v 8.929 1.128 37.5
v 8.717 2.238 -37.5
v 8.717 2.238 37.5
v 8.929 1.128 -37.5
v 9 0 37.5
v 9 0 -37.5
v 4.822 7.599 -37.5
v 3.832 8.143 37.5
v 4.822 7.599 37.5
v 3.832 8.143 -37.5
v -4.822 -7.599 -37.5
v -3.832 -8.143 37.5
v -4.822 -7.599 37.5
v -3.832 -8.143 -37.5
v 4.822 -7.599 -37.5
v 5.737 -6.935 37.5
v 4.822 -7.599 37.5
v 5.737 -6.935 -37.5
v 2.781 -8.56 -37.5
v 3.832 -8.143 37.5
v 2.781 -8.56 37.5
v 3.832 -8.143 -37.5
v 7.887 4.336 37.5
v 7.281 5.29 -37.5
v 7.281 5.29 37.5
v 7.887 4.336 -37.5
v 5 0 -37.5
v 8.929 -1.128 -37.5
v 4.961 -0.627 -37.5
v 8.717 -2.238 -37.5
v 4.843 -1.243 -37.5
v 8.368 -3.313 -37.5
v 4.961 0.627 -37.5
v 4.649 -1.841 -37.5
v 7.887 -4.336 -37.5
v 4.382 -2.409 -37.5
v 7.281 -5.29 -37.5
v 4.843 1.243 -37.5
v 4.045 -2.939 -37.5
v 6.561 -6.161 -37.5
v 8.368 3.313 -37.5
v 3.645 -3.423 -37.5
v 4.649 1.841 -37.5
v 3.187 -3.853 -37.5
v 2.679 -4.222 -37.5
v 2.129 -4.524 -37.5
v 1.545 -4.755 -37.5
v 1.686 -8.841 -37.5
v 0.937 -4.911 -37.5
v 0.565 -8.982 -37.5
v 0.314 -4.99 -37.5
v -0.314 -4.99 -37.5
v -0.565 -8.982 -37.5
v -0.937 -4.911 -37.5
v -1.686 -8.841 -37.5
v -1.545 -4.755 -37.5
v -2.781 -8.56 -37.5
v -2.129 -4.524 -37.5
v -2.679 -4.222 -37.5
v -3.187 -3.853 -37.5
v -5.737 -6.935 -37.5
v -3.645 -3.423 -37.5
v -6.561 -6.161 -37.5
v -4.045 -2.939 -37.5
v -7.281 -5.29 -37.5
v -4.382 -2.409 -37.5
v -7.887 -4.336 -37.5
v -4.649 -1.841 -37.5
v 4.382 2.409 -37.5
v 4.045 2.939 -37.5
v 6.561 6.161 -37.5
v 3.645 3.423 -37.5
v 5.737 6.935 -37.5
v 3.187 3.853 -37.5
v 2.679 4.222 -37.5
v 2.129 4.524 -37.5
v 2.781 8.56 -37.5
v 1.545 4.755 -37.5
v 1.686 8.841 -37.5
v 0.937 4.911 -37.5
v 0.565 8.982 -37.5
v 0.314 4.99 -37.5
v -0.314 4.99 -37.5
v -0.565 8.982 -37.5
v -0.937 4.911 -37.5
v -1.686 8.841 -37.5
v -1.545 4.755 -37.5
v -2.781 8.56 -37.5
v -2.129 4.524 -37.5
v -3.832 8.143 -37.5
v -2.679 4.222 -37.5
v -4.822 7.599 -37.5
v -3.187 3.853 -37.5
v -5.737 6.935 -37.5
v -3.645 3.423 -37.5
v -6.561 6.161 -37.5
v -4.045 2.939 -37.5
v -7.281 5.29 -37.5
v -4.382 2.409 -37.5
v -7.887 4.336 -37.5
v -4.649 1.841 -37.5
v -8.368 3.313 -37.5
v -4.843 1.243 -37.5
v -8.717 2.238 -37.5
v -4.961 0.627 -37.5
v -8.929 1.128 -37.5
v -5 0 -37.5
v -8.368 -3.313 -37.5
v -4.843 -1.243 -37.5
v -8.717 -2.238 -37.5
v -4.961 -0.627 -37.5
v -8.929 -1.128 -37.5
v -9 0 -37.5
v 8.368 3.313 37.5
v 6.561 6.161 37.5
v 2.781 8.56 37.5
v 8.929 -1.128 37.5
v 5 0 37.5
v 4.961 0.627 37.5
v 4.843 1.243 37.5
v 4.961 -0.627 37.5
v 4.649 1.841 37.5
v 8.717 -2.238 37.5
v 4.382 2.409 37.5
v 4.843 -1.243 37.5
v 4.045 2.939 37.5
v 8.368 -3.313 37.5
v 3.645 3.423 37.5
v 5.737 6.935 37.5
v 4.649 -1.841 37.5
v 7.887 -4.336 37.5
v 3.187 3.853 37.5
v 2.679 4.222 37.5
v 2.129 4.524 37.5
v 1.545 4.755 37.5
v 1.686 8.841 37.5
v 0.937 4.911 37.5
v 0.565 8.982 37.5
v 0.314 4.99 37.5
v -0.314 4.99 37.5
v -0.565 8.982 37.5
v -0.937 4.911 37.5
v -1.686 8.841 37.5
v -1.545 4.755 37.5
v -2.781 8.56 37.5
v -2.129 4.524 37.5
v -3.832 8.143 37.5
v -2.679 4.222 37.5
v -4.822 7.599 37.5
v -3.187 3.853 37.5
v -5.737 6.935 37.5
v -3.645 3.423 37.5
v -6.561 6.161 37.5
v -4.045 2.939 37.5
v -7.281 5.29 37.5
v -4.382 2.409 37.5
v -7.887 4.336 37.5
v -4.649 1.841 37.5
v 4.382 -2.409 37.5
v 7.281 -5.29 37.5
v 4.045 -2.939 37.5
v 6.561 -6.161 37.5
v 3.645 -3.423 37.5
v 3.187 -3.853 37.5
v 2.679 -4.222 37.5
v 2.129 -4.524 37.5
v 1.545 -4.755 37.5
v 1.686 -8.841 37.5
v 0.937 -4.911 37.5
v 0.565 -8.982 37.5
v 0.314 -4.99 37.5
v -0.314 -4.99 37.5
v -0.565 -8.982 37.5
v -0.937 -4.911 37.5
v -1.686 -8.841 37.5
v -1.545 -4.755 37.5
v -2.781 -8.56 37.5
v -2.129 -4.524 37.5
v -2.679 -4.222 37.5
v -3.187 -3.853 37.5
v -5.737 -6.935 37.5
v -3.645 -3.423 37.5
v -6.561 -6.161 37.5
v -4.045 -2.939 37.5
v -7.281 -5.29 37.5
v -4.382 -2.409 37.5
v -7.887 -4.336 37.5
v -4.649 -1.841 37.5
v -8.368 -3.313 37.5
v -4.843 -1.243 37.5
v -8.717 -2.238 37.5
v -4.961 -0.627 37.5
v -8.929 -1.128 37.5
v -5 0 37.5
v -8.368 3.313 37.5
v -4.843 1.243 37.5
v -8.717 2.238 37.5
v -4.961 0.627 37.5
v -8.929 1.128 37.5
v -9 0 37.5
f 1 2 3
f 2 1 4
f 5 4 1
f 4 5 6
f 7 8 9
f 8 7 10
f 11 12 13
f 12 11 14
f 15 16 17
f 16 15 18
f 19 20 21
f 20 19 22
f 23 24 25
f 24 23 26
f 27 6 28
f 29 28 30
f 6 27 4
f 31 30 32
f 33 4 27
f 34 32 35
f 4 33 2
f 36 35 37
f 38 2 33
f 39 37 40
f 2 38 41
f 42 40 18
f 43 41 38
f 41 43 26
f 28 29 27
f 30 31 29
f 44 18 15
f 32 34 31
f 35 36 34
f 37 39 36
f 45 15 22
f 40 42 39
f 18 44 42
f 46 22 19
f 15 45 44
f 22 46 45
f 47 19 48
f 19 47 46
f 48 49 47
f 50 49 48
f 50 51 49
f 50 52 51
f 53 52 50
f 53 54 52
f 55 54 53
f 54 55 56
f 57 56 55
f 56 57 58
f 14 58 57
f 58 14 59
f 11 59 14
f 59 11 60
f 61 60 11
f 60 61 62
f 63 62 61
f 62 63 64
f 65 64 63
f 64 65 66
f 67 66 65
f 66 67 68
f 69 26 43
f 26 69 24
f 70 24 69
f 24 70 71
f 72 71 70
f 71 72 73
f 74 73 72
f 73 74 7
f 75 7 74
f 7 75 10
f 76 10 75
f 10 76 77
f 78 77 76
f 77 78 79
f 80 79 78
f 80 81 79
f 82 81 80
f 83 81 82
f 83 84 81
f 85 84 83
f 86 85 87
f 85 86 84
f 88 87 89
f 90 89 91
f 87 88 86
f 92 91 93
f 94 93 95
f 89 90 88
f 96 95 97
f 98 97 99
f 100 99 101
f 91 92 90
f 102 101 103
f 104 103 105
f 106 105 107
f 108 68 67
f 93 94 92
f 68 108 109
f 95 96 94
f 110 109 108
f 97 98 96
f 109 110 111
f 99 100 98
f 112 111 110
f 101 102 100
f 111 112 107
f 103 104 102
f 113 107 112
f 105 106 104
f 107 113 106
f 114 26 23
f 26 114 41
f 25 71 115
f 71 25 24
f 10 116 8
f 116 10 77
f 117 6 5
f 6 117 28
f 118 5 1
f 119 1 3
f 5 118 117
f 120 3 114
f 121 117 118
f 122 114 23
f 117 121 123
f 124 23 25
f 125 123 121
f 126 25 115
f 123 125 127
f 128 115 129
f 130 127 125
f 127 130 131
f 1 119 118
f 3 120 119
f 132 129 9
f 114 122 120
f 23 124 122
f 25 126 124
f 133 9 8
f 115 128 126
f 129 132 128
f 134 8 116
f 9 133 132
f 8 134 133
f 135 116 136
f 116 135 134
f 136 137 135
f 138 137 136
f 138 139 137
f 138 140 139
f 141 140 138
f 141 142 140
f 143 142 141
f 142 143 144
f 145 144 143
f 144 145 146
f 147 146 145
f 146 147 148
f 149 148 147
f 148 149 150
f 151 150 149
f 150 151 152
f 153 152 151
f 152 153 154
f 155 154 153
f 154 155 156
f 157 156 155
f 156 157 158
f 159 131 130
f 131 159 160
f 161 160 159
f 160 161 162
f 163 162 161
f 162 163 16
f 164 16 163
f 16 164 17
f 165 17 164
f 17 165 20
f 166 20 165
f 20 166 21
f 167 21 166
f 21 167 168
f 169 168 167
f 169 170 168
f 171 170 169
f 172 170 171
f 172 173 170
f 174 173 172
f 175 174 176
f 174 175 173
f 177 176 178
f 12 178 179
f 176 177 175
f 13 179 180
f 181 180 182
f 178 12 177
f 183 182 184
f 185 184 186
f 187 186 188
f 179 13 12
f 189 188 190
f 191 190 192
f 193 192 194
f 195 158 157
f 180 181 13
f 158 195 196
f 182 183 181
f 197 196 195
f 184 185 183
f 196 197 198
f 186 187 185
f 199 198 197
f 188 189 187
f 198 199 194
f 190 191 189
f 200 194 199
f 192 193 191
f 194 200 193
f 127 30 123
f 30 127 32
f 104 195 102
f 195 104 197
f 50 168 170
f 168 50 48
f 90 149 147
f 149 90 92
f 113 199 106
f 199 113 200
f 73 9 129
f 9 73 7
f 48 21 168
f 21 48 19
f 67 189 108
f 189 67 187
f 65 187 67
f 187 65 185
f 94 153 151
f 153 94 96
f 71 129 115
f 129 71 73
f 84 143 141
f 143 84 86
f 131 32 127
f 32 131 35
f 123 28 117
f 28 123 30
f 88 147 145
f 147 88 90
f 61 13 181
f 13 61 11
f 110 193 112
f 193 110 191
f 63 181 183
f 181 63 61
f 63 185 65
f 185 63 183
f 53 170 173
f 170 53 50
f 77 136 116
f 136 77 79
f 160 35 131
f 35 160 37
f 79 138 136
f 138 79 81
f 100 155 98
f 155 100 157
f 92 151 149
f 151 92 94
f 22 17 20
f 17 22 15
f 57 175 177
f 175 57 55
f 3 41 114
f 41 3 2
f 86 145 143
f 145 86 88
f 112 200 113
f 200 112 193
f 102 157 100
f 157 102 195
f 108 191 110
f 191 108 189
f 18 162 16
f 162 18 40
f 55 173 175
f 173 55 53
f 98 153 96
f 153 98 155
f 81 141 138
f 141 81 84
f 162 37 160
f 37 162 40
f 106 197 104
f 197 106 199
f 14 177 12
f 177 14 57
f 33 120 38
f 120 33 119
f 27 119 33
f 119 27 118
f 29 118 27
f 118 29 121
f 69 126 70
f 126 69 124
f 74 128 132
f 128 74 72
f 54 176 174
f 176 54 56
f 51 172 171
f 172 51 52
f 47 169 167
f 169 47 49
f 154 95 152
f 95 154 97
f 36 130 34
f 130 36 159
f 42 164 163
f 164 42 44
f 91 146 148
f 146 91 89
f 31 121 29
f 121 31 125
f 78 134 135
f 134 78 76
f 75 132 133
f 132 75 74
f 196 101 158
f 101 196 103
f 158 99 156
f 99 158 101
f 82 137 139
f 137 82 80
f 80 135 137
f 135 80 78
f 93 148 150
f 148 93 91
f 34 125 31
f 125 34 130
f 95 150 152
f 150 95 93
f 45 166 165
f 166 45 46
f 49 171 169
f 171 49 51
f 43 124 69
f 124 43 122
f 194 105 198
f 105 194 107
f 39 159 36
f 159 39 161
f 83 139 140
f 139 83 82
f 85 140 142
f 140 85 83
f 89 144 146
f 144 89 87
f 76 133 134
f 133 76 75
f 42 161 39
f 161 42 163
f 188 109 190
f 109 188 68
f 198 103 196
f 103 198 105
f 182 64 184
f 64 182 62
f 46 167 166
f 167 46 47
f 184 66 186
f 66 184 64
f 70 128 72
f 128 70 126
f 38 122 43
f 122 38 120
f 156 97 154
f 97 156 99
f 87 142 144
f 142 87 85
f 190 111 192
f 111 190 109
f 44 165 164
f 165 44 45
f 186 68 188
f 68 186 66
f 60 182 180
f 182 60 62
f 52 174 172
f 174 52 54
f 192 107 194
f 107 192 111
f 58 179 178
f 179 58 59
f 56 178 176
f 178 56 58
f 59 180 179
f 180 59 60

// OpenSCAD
$fn = 50;


difference() {
	union() {
		translate(v = [0, 0, -37.5000000000]) {
			cylinder(h = 75, r = 9.0000000000);
		}
	}
	union() {
		translate(v = [0, 0, -100.0000000000]) {
			cylinder(h = 200, r = 5.0000000000);
		}
	}
}
